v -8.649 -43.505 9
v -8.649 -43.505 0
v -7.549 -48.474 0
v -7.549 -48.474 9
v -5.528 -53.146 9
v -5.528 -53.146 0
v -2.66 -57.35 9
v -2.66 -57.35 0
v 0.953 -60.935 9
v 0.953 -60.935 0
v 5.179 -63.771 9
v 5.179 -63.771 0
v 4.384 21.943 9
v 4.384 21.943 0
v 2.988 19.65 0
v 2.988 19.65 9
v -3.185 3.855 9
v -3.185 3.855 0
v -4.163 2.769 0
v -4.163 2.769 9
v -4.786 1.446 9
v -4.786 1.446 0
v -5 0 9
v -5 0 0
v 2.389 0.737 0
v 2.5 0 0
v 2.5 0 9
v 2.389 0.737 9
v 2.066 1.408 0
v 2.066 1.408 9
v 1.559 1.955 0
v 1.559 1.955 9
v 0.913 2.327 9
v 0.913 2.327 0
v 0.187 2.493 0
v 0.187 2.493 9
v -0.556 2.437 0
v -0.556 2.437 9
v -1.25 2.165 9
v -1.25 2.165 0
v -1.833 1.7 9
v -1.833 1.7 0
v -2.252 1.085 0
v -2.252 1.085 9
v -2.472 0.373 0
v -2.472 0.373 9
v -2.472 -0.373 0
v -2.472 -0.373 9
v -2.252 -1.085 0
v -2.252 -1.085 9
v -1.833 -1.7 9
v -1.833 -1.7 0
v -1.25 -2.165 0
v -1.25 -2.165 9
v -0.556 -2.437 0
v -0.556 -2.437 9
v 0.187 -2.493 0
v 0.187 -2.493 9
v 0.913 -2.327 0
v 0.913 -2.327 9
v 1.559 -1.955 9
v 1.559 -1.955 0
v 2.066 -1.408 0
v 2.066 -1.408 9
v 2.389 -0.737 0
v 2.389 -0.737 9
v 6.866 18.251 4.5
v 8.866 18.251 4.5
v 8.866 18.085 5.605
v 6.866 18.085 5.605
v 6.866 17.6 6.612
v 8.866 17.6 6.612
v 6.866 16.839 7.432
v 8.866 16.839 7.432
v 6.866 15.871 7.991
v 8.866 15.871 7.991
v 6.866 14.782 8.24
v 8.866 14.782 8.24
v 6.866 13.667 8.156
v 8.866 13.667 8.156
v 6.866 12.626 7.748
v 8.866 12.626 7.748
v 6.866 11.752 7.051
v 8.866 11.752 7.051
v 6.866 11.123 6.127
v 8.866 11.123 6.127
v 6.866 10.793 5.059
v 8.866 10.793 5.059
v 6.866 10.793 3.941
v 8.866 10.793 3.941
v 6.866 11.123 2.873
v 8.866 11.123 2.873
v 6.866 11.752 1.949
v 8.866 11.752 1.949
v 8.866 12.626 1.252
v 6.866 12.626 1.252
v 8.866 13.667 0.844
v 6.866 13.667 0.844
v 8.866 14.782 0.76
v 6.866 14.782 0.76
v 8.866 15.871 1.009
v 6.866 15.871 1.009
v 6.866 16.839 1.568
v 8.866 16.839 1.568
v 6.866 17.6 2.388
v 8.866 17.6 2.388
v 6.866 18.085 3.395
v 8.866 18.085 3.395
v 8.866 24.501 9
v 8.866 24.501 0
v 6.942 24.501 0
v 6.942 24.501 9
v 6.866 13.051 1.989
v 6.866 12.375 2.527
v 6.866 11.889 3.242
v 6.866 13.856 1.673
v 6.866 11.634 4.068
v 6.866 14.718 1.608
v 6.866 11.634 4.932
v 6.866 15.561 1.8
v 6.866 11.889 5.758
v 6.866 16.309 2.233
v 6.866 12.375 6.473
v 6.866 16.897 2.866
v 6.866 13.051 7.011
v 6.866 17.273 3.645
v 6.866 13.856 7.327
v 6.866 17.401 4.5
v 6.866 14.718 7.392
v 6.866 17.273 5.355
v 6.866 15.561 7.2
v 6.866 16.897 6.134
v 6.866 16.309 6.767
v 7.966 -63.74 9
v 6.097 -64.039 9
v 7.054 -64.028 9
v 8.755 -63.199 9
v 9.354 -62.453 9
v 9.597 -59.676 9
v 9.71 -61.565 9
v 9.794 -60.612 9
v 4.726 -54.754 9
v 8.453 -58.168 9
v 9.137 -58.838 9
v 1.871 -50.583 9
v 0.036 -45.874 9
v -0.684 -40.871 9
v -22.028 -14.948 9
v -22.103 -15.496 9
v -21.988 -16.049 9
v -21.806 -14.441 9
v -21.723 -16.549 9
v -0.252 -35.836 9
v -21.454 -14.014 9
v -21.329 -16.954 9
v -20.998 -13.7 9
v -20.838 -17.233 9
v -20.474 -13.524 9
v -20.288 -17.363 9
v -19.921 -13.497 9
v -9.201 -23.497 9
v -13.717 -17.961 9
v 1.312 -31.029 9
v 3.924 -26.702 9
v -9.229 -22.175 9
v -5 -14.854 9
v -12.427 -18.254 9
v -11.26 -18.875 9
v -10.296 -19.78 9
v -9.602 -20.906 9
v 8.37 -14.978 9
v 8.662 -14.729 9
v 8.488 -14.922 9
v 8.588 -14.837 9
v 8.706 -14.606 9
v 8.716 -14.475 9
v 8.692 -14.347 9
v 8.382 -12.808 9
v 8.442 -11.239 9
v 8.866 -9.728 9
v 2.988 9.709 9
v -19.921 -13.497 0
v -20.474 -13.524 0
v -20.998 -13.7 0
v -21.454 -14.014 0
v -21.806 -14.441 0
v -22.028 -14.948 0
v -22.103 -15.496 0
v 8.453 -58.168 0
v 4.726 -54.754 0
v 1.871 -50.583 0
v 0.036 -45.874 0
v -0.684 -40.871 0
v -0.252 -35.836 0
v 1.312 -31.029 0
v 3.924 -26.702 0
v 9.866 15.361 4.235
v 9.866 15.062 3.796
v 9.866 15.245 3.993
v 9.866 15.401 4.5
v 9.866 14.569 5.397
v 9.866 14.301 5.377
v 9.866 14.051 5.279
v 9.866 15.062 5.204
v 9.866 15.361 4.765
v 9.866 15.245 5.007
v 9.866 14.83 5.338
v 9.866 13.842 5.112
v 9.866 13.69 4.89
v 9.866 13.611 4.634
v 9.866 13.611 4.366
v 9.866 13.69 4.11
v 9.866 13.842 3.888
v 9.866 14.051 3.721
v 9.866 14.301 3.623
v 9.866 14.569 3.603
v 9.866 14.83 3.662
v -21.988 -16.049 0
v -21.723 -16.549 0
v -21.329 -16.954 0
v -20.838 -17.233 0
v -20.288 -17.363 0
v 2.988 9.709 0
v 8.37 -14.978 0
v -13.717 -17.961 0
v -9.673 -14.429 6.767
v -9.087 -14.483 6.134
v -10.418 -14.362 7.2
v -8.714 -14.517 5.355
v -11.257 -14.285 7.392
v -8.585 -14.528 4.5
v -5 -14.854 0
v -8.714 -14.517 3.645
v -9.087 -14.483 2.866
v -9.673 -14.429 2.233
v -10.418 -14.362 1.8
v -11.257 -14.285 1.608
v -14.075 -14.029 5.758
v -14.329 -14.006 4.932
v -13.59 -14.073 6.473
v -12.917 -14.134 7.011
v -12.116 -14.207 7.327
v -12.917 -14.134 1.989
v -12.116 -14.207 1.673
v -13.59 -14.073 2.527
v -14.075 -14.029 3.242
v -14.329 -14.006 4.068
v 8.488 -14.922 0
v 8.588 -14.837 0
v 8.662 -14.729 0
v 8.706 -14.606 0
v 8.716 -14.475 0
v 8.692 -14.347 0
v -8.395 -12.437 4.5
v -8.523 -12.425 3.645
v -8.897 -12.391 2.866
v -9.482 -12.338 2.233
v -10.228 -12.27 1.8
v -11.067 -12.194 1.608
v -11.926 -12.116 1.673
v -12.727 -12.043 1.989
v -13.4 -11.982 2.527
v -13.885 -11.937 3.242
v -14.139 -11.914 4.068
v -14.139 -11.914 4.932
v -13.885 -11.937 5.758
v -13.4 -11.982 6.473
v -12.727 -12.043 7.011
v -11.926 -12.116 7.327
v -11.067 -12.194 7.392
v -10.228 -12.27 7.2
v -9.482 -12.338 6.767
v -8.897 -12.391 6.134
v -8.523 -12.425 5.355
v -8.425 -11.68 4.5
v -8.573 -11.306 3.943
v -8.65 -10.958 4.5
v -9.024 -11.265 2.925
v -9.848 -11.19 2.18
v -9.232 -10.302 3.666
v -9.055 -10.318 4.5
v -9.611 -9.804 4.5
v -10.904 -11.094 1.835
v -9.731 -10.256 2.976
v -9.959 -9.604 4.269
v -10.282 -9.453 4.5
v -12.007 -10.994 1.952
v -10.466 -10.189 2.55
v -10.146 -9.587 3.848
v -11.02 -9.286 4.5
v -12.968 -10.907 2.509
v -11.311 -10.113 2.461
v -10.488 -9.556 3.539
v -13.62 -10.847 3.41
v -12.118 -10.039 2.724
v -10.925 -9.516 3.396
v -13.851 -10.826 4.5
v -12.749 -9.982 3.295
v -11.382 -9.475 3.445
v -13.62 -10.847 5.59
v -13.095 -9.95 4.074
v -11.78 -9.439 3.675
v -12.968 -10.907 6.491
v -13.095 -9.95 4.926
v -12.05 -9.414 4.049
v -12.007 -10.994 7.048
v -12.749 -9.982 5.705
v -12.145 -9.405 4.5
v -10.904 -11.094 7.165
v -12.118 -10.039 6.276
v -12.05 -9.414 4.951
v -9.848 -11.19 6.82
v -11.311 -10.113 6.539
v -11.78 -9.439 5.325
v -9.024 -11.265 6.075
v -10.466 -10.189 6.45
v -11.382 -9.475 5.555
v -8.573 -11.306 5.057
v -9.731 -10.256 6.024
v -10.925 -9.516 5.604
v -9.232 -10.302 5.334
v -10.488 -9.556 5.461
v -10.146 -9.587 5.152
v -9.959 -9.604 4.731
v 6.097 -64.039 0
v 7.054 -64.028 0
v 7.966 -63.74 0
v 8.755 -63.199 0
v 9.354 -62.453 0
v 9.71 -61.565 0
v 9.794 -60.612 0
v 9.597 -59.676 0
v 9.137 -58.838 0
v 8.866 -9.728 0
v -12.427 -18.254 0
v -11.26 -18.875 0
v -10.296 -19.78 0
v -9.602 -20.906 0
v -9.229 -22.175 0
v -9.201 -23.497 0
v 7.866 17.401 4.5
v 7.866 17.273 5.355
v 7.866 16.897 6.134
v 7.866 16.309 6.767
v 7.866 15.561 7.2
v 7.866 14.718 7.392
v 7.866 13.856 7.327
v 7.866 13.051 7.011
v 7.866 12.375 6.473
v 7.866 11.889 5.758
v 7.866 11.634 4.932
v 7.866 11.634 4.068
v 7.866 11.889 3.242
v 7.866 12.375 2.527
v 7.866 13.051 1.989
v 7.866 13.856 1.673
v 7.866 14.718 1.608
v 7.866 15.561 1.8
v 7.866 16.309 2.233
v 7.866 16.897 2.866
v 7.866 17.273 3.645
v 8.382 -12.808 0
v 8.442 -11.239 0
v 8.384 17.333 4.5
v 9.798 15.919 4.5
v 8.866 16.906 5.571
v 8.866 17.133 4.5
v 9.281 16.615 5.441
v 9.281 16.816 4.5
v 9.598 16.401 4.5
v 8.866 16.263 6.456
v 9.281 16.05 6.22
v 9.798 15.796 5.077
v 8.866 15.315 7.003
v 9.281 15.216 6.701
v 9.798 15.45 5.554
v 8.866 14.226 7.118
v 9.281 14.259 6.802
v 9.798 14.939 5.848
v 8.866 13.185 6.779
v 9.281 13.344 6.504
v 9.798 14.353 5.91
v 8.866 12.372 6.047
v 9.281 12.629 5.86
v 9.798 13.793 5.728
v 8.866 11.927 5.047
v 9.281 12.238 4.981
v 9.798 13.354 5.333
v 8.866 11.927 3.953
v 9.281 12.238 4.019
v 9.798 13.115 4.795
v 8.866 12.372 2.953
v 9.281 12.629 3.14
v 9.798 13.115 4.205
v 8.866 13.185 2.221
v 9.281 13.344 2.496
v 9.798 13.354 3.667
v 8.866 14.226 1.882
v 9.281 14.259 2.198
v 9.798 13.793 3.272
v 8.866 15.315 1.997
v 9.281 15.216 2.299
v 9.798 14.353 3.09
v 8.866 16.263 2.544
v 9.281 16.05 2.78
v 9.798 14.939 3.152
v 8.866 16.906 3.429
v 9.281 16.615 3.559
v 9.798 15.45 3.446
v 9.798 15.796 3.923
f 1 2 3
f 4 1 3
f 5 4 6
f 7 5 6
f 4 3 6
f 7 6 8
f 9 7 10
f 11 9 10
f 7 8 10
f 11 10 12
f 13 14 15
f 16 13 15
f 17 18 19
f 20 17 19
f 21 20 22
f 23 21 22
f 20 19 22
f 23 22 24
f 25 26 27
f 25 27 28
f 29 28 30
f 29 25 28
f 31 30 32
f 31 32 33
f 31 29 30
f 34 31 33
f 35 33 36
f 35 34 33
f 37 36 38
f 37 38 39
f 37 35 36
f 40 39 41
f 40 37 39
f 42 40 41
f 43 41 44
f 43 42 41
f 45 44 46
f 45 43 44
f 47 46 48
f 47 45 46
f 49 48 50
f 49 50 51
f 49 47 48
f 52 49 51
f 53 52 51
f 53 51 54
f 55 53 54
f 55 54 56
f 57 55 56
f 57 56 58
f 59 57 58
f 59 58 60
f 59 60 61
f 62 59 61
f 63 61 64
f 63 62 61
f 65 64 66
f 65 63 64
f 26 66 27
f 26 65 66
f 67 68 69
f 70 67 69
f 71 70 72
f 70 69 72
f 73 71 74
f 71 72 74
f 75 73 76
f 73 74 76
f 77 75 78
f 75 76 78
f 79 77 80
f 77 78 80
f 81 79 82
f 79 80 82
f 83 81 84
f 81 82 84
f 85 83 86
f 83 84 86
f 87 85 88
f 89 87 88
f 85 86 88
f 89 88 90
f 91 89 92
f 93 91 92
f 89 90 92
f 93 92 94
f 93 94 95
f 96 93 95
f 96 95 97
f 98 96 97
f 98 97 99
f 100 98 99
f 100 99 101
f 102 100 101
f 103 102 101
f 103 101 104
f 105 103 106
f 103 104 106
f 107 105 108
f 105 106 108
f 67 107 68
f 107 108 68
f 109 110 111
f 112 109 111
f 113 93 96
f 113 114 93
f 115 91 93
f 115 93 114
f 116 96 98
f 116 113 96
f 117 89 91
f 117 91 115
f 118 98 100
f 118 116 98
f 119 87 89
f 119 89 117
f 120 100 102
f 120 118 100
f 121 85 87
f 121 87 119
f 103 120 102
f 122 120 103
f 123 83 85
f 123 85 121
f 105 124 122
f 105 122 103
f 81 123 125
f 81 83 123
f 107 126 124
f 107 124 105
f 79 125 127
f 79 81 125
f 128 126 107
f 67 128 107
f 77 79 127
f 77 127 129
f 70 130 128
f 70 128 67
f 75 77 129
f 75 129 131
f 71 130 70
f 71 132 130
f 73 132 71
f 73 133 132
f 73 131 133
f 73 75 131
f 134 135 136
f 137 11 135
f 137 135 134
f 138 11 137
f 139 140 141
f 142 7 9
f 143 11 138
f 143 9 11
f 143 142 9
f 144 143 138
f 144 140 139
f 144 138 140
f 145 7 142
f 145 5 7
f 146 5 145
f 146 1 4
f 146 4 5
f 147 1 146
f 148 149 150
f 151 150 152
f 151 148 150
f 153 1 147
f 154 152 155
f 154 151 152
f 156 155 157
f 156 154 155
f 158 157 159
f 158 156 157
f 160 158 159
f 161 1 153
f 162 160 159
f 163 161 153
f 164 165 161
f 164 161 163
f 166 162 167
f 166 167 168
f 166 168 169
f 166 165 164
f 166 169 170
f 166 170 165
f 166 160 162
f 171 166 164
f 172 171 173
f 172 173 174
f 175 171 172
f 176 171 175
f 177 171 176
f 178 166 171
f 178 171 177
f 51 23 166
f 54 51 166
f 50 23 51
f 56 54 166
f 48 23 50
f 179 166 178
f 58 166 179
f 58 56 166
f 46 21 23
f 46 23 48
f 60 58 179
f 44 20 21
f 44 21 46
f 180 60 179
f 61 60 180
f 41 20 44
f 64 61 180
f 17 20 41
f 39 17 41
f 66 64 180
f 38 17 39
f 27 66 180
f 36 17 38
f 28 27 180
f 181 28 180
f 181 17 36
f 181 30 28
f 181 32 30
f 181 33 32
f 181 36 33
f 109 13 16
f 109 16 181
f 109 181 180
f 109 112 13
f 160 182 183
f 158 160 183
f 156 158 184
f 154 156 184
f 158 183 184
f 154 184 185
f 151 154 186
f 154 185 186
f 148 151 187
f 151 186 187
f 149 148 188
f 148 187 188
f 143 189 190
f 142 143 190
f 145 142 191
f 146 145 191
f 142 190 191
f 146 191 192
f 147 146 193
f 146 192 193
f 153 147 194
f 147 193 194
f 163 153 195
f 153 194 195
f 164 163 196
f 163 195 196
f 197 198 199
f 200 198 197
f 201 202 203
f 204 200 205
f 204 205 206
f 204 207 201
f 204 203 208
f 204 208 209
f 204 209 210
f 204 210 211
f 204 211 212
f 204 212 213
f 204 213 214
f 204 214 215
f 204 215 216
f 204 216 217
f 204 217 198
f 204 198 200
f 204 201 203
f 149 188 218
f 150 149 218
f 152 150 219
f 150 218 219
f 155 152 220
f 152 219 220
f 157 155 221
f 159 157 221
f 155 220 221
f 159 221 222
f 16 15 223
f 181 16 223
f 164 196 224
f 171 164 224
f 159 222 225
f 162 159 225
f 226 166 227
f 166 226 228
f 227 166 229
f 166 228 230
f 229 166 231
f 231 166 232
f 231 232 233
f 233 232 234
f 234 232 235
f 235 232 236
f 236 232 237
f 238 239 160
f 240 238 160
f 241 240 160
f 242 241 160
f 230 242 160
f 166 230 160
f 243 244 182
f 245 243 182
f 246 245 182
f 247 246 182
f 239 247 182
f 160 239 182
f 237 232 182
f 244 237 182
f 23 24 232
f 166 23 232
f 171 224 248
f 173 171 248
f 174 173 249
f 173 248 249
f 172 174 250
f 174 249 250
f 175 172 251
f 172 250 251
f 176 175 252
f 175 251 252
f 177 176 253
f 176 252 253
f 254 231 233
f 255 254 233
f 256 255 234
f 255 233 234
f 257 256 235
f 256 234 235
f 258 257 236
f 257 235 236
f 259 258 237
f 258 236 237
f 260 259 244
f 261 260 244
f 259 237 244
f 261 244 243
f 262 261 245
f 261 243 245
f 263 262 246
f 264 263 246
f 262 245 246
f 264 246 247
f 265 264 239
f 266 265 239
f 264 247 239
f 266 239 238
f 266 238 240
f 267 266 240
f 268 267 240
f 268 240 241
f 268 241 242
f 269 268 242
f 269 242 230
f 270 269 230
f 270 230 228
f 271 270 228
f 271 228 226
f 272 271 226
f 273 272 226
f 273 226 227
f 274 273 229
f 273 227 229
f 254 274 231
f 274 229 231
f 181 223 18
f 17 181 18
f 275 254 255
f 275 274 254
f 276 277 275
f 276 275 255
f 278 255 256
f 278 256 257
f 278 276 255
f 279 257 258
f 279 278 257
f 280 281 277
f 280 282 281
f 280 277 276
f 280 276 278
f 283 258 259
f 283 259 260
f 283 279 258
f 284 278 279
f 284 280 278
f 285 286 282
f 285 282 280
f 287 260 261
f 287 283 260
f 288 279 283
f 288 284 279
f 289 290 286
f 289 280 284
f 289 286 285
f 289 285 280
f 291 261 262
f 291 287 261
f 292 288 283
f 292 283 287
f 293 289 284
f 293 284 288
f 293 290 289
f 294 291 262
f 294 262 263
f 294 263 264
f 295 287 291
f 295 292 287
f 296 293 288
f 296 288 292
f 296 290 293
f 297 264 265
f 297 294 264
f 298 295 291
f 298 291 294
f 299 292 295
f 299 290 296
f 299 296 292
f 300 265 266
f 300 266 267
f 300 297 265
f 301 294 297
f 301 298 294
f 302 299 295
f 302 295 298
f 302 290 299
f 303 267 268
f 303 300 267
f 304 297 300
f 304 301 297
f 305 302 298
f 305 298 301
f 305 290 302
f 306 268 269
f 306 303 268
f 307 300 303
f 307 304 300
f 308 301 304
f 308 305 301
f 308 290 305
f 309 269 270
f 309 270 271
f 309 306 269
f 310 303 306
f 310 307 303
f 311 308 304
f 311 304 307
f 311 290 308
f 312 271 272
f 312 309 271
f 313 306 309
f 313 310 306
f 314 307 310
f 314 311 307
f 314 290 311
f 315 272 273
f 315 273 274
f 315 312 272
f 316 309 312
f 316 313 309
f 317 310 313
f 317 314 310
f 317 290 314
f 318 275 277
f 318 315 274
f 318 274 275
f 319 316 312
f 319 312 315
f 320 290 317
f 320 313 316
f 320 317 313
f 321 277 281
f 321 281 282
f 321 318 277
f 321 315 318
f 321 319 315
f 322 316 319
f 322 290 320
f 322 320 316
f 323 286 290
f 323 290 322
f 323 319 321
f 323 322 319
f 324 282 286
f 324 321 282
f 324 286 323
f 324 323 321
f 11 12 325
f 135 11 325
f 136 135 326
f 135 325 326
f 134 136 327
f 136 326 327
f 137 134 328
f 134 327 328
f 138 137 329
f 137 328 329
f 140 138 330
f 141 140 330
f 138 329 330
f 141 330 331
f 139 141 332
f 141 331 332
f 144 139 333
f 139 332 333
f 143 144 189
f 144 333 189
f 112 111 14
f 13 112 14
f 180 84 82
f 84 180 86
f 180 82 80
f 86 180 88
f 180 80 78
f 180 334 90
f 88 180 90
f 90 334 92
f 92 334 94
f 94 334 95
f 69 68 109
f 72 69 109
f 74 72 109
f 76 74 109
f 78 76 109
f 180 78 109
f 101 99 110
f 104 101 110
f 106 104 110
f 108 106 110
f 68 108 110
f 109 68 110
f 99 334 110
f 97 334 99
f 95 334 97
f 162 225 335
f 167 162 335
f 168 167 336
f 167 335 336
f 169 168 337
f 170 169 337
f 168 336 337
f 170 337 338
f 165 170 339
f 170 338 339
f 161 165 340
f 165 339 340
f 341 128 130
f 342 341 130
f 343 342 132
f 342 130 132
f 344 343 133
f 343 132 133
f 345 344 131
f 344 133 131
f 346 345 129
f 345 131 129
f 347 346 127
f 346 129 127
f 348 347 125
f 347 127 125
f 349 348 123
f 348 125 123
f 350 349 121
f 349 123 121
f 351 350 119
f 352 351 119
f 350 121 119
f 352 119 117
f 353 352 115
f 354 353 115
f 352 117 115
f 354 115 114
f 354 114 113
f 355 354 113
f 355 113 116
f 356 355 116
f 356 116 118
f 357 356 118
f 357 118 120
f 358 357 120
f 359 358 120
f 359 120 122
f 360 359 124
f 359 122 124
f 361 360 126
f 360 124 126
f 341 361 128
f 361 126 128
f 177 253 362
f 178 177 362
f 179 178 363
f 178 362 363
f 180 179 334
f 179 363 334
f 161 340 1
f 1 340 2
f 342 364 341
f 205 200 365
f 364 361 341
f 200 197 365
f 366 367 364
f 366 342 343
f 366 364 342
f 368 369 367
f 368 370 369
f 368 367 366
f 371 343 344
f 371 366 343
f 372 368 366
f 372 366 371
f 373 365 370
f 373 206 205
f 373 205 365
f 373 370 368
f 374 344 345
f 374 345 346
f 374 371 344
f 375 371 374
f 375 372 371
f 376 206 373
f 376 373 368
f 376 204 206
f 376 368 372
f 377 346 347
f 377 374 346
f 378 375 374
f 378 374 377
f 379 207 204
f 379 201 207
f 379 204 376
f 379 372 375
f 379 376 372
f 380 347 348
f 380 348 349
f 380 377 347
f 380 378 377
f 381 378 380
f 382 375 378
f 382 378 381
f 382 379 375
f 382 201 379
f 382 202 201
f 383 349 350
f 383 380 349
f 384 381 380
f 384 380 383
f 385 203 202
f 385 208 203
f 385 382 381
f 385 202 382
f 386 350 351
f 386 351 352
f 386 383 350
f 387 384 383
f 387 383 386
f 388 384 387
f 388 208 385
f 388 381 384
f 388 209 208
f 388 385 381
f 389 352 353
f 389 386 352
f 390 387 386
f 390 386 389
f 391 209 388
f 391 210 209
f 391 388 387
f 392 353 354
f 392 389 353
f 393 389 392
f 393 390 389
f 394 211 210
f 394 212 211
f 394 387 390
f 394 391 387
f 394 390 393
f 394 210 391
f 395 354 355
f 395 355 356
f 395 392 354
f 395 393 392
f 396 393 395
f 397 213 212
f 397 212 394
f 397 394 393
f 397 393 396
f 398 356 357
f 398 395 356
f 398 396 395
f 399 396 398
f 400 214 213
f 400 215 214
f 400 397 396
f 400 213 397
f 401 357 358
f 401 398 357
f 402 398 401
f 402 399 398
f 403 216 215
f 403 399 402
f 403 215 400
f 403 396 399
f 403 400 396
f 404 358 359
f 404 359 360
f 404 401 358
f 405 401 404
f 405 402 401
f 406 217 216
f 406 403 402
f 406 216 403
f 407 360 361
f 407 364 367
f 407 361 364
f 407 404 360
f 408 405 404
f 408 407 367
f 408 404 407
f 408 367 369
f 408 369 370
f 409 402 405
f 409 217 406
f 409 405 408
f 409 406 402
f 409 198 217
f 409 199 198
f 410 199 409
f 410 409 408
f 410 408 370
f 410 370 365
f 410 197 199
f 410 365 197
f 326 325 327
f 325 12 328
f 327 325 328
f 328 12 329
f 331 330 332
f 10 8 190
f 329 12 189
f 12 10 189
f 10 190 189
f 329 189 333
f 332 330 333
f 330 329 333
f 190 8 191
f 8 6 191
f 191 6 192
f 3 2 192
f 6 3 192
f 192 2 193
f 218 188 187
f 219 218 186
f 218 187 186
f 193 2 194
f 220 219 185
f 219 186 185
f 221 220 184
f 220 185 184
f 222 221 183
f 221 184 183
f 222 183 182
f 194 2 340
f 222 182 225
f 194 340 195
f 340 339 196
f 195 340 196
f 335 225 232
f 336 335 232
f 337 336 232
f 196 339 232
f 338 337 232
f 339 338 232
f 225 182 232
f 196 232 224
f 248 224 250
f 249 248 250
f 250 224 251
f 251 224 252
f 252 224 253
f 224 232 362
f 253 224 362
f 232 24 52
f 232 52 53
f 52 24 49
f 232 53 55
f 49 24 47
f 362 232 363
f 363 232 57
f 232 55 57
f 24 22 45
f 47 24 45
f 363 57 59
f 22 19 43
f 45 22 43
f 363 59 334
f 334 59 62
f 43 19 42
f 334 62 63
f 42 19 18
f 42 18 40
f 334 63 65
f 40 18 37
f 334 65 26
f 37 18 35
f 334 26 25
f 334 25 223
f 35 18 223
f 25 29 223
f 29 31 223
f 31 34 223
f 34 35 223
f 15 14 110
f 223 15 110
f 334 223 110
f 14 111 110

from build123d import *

# Parameters (mm, degrees)
SKETCH_1_R          = 5
SKETCH_1_R_2        = 2.5
EXTRUDE_1_DEPTH     = 9
SKETCH_2_R          = 3.75
CUT_EXTRUDE_1_DEPTH = 2
SKETCH_3_R          = 2.9
EXTRUDE_2_DEPTH     = 3
FILLET_1_R          = 2
SKETCH_4_R          = 2.9
EXTRUDE_3_DEPTH     = 5
FILLET_2_R          = 2.9


with BuildPart() as part:
    # 스케치1 → 보스-돌출1 (new body)
    # profile 1 of 5: a face of its own
    with BuildSketch(Plane.XY):
        with BuildLine():
            Line((8.866410343, 21.94338903), (4.384187039, 21.94338903))
            Line((4.384187039, 21.94338903), (2.987768149, 19.65002342))
            Line((2.987768149, 19.65002342), (2.987768149, 17.661246793))
            Line((2.987768149, 17.661246793), (2.987768149, 9.70876495))
            Line((2.987768149, 9.70876495), (-3.184671245, 3.854590647))
            ThreePointArc((-3.184671245, 3.854590647), (2.13033375, 4.523458645), (5, 0))
            ThreePointArc((5, 0), (0, -5), (-5, 0))
            Line((-5, 0), (-5, -14.85442617))
            Line((-5, -14.85442617), (-19.921487255, -13.496967469))
            ThreePointArc((-19.921487255, -13.496967469), (-21.453925628, -14.014242075), (-22.102673306, -15.49581787))
            ThreePointArc((-22.102673306, -15.49581787), (-21.54079944, -16.765444299), (-20.287735083, -17.363343312))
            Line((-20.287735083, -17.363343312), (-13.716958703, -17.9611093))
            ThreePointArc((-13.716958703, -17.9611093), (-10.295562947, -19.77999502), (-9.201017746, -23.497018692))
            Line((-9.201017746, -23.497018692), (-8.648726299, -43.504972105))
            ThreePointArc((-8.648726299, -43.504972105), (-4.194233385, -55.315987694), (5.178631732, -63.771281648))
            ThreePointArc((5.178631732, -63.771281648), (9.354068035, -62.453221011), (8.453005262, -58.168406191))
            ThreePointArc((8.453005262, -58.168406191), (-0.467627925, -43.39335713), (3.924251711, -26.702306699))
            Line((3.924251711, -26.702306699), (8.3701186, -14.978169718))
            ThreePointArc((8.3701186, -14.978169718), (8.662275884, -14.729272874), (8.69193724, -14.346616734))
            ThreePointArc((8.69193724, -14.346616734), (8.365752146, -12.021808556), (8.866410343, -9.728236855))
            Line((8.866410343, -9.728236855), (8.866410343, 21.94338903))
        make_face()
    # profile 2 of 5: a face of its own
    with BuildSketch(Plane.XY):
        Circle(SKETCH_1_R)
        Circle(SKETCH_1_R_2, mode=Mode.SUBTRACT)
    # profile 3 of 5: a face of its own
    with BuildSketch(Plane.XY):
        with BuildLine():
            ThreePointArc((5, 0), (2.13033375, 4.523458645), (-3.184671245, 3.854590647))
            ThreePointArc((-3.184671245, 3.854590647), (-4.523458645, 2.13033375), (-5, 0))
            ThreePointArc((-5, 0), (0, -5), (5, 0))
        make_face()
        Circle(SKETCH_1_R_2, mode=Mode.SUBTRACT)
    # profile 4 of 5: a face of its own
    with BuildSketch(Plane.XY):
        Polygon((8.866410343, 24.501339074), (6.942137083, 24.501339074), (4.384187039, 21.94338903), (8.866410343, 21.94338903), align=None)
    # profile 5 of 5: a face of its own
    with BuildSketch(Plane.XY):
        with BuildLine():
            Line((8.866410343, 21.94338903), (4.384187039, 21.94338903))
            Line((4.384187039, 21.94338903), (2.987768149, 19.65002342))
            Line((2.987768149, 19.65002342), (2.987768149, 17.661246793))
            Line((2.987768149, 17.661246793), (2.987768149, 9.70876495))
            Line((2.987768149, 9.70876495), (-3.184671245, 3.854590647))
            ThreePointArc((-3.184671245, 3.854590647), (2.13033375, 4.523458645), (5, 0))
            ThreePointArc((5, 0), (0, -5), (-5, 0))
            Line((-5, 0), (-5, -14.85442617))
            Line((-5, -14.85442617), (-19.921487255, -13.496967469))
            ThreePointArc((-19.921487255, -13.496967469), (-21.453925628, -14.014242075), (-22.102673306, -15.49581787))
            ThreePointArc((-22.102673306, -15.49581787), (-21.54079944, -16.765444299), (-20.287735083, -17.363343312))
            Line((-20.287735083, -17.363343312), (-13.716958703, -17.9611093))
            ThreePointArc((-13.716958703, -17.9611093), (-10.295562947, -19.77999502), (-9.201017746, -23.497018692))
            Line((-9.201017746, -23.497018692), (-8.648726299, -43.504972105))
            ThreePointArc((-8.648726299, -43.504972105), (-4.194233385, -55.315987694), (5.178631732, -63.771281648))
            ThreePointArc((5.178631732, -63.771281648), (9.354068035, -62.453221011), (8.453005262, -58.168406191))
            ThreePointArc((8.453005262, -58.168406191), (-0.467627925, -43.39335713), (3.924251711, -26.702306699))
            Line((3.924251711, -26.702306699), (8.3701186, -14.978169718))
            ThreePointArc((8.3701186, -14.978169718), (8.662275884, -14.729272874), (8.69193724, -14.346616734))
            ThreePointArc((8.69193724, -14.346616734), (8.365752146, -12.021808556), (8.866410343, -9.728236855))
            Line((8.866410343, -9.728236855), (8.866410343, 21.94338903))
        make_face()
    extrude(amount=EXTRUDE_1_DEPTH)

    # 스케치2 → 컷-돌출1 (cut)
    with BuildSketch(Plane(origin=(8.866410343, 0, 0), x_dir=(0, 0, -1), z_dir=(1, 0, 0))):
        with Locations(Location((-4.5, 14.501339074, 0), (0, 0, 90))):
            Circle(SKETCH_2_R)
    extrude(amount=-CUT_EXTRUDE_1_DEPTH, mode=Mode.SUBTRACT)

    # 스케치3 → 보스-돌출2 (add)
    with BuildSketch(Plane(origin=(6.866410343, 0, 0), x_dir=(0, 0, -1), z_dir=(1, 0, 0))):
        with Locations(Location((-4.5, 14.501339074, 0), (0, 0, 90))):
            Circle(SKETCH_3_R)
    extrude(amount=EXTRUDE_2_DEPTH)

    # 필렛1
    fillet_1_edges = [part.edges().sort_by_distance(p)[0] for p in [
        (9.866410343, 11.601339074, 4.5),
    ]]
    fillet(fillet_1_edges, radius=FILLET_1_R)

    # 스케치4 → 보스-돌출3 (add)
    with BuildSketch(Plane(origin=(-1.381306819, -15.183631058, 0), x_dir=(0.995887428286197, -0.09059928355955607, 0), z_dir=(0.09059928355955607, 0.995887428286197, 0))):
        with Locations((-10.133636773, -4.5)):
            Circle(SKETCH_4_R)
    extrude(amount=EXTRUDE_3_DEPTH)

    # 필렛2
    fillet_2_edges = [part.edges().sort_by_distance(p)[0] for p in [
        (-13.908345408, -9.023355763, 4.5),
    ]]
    fillet(fillet_2_edges, radius=FILLET_2_R)


solid = part.part
